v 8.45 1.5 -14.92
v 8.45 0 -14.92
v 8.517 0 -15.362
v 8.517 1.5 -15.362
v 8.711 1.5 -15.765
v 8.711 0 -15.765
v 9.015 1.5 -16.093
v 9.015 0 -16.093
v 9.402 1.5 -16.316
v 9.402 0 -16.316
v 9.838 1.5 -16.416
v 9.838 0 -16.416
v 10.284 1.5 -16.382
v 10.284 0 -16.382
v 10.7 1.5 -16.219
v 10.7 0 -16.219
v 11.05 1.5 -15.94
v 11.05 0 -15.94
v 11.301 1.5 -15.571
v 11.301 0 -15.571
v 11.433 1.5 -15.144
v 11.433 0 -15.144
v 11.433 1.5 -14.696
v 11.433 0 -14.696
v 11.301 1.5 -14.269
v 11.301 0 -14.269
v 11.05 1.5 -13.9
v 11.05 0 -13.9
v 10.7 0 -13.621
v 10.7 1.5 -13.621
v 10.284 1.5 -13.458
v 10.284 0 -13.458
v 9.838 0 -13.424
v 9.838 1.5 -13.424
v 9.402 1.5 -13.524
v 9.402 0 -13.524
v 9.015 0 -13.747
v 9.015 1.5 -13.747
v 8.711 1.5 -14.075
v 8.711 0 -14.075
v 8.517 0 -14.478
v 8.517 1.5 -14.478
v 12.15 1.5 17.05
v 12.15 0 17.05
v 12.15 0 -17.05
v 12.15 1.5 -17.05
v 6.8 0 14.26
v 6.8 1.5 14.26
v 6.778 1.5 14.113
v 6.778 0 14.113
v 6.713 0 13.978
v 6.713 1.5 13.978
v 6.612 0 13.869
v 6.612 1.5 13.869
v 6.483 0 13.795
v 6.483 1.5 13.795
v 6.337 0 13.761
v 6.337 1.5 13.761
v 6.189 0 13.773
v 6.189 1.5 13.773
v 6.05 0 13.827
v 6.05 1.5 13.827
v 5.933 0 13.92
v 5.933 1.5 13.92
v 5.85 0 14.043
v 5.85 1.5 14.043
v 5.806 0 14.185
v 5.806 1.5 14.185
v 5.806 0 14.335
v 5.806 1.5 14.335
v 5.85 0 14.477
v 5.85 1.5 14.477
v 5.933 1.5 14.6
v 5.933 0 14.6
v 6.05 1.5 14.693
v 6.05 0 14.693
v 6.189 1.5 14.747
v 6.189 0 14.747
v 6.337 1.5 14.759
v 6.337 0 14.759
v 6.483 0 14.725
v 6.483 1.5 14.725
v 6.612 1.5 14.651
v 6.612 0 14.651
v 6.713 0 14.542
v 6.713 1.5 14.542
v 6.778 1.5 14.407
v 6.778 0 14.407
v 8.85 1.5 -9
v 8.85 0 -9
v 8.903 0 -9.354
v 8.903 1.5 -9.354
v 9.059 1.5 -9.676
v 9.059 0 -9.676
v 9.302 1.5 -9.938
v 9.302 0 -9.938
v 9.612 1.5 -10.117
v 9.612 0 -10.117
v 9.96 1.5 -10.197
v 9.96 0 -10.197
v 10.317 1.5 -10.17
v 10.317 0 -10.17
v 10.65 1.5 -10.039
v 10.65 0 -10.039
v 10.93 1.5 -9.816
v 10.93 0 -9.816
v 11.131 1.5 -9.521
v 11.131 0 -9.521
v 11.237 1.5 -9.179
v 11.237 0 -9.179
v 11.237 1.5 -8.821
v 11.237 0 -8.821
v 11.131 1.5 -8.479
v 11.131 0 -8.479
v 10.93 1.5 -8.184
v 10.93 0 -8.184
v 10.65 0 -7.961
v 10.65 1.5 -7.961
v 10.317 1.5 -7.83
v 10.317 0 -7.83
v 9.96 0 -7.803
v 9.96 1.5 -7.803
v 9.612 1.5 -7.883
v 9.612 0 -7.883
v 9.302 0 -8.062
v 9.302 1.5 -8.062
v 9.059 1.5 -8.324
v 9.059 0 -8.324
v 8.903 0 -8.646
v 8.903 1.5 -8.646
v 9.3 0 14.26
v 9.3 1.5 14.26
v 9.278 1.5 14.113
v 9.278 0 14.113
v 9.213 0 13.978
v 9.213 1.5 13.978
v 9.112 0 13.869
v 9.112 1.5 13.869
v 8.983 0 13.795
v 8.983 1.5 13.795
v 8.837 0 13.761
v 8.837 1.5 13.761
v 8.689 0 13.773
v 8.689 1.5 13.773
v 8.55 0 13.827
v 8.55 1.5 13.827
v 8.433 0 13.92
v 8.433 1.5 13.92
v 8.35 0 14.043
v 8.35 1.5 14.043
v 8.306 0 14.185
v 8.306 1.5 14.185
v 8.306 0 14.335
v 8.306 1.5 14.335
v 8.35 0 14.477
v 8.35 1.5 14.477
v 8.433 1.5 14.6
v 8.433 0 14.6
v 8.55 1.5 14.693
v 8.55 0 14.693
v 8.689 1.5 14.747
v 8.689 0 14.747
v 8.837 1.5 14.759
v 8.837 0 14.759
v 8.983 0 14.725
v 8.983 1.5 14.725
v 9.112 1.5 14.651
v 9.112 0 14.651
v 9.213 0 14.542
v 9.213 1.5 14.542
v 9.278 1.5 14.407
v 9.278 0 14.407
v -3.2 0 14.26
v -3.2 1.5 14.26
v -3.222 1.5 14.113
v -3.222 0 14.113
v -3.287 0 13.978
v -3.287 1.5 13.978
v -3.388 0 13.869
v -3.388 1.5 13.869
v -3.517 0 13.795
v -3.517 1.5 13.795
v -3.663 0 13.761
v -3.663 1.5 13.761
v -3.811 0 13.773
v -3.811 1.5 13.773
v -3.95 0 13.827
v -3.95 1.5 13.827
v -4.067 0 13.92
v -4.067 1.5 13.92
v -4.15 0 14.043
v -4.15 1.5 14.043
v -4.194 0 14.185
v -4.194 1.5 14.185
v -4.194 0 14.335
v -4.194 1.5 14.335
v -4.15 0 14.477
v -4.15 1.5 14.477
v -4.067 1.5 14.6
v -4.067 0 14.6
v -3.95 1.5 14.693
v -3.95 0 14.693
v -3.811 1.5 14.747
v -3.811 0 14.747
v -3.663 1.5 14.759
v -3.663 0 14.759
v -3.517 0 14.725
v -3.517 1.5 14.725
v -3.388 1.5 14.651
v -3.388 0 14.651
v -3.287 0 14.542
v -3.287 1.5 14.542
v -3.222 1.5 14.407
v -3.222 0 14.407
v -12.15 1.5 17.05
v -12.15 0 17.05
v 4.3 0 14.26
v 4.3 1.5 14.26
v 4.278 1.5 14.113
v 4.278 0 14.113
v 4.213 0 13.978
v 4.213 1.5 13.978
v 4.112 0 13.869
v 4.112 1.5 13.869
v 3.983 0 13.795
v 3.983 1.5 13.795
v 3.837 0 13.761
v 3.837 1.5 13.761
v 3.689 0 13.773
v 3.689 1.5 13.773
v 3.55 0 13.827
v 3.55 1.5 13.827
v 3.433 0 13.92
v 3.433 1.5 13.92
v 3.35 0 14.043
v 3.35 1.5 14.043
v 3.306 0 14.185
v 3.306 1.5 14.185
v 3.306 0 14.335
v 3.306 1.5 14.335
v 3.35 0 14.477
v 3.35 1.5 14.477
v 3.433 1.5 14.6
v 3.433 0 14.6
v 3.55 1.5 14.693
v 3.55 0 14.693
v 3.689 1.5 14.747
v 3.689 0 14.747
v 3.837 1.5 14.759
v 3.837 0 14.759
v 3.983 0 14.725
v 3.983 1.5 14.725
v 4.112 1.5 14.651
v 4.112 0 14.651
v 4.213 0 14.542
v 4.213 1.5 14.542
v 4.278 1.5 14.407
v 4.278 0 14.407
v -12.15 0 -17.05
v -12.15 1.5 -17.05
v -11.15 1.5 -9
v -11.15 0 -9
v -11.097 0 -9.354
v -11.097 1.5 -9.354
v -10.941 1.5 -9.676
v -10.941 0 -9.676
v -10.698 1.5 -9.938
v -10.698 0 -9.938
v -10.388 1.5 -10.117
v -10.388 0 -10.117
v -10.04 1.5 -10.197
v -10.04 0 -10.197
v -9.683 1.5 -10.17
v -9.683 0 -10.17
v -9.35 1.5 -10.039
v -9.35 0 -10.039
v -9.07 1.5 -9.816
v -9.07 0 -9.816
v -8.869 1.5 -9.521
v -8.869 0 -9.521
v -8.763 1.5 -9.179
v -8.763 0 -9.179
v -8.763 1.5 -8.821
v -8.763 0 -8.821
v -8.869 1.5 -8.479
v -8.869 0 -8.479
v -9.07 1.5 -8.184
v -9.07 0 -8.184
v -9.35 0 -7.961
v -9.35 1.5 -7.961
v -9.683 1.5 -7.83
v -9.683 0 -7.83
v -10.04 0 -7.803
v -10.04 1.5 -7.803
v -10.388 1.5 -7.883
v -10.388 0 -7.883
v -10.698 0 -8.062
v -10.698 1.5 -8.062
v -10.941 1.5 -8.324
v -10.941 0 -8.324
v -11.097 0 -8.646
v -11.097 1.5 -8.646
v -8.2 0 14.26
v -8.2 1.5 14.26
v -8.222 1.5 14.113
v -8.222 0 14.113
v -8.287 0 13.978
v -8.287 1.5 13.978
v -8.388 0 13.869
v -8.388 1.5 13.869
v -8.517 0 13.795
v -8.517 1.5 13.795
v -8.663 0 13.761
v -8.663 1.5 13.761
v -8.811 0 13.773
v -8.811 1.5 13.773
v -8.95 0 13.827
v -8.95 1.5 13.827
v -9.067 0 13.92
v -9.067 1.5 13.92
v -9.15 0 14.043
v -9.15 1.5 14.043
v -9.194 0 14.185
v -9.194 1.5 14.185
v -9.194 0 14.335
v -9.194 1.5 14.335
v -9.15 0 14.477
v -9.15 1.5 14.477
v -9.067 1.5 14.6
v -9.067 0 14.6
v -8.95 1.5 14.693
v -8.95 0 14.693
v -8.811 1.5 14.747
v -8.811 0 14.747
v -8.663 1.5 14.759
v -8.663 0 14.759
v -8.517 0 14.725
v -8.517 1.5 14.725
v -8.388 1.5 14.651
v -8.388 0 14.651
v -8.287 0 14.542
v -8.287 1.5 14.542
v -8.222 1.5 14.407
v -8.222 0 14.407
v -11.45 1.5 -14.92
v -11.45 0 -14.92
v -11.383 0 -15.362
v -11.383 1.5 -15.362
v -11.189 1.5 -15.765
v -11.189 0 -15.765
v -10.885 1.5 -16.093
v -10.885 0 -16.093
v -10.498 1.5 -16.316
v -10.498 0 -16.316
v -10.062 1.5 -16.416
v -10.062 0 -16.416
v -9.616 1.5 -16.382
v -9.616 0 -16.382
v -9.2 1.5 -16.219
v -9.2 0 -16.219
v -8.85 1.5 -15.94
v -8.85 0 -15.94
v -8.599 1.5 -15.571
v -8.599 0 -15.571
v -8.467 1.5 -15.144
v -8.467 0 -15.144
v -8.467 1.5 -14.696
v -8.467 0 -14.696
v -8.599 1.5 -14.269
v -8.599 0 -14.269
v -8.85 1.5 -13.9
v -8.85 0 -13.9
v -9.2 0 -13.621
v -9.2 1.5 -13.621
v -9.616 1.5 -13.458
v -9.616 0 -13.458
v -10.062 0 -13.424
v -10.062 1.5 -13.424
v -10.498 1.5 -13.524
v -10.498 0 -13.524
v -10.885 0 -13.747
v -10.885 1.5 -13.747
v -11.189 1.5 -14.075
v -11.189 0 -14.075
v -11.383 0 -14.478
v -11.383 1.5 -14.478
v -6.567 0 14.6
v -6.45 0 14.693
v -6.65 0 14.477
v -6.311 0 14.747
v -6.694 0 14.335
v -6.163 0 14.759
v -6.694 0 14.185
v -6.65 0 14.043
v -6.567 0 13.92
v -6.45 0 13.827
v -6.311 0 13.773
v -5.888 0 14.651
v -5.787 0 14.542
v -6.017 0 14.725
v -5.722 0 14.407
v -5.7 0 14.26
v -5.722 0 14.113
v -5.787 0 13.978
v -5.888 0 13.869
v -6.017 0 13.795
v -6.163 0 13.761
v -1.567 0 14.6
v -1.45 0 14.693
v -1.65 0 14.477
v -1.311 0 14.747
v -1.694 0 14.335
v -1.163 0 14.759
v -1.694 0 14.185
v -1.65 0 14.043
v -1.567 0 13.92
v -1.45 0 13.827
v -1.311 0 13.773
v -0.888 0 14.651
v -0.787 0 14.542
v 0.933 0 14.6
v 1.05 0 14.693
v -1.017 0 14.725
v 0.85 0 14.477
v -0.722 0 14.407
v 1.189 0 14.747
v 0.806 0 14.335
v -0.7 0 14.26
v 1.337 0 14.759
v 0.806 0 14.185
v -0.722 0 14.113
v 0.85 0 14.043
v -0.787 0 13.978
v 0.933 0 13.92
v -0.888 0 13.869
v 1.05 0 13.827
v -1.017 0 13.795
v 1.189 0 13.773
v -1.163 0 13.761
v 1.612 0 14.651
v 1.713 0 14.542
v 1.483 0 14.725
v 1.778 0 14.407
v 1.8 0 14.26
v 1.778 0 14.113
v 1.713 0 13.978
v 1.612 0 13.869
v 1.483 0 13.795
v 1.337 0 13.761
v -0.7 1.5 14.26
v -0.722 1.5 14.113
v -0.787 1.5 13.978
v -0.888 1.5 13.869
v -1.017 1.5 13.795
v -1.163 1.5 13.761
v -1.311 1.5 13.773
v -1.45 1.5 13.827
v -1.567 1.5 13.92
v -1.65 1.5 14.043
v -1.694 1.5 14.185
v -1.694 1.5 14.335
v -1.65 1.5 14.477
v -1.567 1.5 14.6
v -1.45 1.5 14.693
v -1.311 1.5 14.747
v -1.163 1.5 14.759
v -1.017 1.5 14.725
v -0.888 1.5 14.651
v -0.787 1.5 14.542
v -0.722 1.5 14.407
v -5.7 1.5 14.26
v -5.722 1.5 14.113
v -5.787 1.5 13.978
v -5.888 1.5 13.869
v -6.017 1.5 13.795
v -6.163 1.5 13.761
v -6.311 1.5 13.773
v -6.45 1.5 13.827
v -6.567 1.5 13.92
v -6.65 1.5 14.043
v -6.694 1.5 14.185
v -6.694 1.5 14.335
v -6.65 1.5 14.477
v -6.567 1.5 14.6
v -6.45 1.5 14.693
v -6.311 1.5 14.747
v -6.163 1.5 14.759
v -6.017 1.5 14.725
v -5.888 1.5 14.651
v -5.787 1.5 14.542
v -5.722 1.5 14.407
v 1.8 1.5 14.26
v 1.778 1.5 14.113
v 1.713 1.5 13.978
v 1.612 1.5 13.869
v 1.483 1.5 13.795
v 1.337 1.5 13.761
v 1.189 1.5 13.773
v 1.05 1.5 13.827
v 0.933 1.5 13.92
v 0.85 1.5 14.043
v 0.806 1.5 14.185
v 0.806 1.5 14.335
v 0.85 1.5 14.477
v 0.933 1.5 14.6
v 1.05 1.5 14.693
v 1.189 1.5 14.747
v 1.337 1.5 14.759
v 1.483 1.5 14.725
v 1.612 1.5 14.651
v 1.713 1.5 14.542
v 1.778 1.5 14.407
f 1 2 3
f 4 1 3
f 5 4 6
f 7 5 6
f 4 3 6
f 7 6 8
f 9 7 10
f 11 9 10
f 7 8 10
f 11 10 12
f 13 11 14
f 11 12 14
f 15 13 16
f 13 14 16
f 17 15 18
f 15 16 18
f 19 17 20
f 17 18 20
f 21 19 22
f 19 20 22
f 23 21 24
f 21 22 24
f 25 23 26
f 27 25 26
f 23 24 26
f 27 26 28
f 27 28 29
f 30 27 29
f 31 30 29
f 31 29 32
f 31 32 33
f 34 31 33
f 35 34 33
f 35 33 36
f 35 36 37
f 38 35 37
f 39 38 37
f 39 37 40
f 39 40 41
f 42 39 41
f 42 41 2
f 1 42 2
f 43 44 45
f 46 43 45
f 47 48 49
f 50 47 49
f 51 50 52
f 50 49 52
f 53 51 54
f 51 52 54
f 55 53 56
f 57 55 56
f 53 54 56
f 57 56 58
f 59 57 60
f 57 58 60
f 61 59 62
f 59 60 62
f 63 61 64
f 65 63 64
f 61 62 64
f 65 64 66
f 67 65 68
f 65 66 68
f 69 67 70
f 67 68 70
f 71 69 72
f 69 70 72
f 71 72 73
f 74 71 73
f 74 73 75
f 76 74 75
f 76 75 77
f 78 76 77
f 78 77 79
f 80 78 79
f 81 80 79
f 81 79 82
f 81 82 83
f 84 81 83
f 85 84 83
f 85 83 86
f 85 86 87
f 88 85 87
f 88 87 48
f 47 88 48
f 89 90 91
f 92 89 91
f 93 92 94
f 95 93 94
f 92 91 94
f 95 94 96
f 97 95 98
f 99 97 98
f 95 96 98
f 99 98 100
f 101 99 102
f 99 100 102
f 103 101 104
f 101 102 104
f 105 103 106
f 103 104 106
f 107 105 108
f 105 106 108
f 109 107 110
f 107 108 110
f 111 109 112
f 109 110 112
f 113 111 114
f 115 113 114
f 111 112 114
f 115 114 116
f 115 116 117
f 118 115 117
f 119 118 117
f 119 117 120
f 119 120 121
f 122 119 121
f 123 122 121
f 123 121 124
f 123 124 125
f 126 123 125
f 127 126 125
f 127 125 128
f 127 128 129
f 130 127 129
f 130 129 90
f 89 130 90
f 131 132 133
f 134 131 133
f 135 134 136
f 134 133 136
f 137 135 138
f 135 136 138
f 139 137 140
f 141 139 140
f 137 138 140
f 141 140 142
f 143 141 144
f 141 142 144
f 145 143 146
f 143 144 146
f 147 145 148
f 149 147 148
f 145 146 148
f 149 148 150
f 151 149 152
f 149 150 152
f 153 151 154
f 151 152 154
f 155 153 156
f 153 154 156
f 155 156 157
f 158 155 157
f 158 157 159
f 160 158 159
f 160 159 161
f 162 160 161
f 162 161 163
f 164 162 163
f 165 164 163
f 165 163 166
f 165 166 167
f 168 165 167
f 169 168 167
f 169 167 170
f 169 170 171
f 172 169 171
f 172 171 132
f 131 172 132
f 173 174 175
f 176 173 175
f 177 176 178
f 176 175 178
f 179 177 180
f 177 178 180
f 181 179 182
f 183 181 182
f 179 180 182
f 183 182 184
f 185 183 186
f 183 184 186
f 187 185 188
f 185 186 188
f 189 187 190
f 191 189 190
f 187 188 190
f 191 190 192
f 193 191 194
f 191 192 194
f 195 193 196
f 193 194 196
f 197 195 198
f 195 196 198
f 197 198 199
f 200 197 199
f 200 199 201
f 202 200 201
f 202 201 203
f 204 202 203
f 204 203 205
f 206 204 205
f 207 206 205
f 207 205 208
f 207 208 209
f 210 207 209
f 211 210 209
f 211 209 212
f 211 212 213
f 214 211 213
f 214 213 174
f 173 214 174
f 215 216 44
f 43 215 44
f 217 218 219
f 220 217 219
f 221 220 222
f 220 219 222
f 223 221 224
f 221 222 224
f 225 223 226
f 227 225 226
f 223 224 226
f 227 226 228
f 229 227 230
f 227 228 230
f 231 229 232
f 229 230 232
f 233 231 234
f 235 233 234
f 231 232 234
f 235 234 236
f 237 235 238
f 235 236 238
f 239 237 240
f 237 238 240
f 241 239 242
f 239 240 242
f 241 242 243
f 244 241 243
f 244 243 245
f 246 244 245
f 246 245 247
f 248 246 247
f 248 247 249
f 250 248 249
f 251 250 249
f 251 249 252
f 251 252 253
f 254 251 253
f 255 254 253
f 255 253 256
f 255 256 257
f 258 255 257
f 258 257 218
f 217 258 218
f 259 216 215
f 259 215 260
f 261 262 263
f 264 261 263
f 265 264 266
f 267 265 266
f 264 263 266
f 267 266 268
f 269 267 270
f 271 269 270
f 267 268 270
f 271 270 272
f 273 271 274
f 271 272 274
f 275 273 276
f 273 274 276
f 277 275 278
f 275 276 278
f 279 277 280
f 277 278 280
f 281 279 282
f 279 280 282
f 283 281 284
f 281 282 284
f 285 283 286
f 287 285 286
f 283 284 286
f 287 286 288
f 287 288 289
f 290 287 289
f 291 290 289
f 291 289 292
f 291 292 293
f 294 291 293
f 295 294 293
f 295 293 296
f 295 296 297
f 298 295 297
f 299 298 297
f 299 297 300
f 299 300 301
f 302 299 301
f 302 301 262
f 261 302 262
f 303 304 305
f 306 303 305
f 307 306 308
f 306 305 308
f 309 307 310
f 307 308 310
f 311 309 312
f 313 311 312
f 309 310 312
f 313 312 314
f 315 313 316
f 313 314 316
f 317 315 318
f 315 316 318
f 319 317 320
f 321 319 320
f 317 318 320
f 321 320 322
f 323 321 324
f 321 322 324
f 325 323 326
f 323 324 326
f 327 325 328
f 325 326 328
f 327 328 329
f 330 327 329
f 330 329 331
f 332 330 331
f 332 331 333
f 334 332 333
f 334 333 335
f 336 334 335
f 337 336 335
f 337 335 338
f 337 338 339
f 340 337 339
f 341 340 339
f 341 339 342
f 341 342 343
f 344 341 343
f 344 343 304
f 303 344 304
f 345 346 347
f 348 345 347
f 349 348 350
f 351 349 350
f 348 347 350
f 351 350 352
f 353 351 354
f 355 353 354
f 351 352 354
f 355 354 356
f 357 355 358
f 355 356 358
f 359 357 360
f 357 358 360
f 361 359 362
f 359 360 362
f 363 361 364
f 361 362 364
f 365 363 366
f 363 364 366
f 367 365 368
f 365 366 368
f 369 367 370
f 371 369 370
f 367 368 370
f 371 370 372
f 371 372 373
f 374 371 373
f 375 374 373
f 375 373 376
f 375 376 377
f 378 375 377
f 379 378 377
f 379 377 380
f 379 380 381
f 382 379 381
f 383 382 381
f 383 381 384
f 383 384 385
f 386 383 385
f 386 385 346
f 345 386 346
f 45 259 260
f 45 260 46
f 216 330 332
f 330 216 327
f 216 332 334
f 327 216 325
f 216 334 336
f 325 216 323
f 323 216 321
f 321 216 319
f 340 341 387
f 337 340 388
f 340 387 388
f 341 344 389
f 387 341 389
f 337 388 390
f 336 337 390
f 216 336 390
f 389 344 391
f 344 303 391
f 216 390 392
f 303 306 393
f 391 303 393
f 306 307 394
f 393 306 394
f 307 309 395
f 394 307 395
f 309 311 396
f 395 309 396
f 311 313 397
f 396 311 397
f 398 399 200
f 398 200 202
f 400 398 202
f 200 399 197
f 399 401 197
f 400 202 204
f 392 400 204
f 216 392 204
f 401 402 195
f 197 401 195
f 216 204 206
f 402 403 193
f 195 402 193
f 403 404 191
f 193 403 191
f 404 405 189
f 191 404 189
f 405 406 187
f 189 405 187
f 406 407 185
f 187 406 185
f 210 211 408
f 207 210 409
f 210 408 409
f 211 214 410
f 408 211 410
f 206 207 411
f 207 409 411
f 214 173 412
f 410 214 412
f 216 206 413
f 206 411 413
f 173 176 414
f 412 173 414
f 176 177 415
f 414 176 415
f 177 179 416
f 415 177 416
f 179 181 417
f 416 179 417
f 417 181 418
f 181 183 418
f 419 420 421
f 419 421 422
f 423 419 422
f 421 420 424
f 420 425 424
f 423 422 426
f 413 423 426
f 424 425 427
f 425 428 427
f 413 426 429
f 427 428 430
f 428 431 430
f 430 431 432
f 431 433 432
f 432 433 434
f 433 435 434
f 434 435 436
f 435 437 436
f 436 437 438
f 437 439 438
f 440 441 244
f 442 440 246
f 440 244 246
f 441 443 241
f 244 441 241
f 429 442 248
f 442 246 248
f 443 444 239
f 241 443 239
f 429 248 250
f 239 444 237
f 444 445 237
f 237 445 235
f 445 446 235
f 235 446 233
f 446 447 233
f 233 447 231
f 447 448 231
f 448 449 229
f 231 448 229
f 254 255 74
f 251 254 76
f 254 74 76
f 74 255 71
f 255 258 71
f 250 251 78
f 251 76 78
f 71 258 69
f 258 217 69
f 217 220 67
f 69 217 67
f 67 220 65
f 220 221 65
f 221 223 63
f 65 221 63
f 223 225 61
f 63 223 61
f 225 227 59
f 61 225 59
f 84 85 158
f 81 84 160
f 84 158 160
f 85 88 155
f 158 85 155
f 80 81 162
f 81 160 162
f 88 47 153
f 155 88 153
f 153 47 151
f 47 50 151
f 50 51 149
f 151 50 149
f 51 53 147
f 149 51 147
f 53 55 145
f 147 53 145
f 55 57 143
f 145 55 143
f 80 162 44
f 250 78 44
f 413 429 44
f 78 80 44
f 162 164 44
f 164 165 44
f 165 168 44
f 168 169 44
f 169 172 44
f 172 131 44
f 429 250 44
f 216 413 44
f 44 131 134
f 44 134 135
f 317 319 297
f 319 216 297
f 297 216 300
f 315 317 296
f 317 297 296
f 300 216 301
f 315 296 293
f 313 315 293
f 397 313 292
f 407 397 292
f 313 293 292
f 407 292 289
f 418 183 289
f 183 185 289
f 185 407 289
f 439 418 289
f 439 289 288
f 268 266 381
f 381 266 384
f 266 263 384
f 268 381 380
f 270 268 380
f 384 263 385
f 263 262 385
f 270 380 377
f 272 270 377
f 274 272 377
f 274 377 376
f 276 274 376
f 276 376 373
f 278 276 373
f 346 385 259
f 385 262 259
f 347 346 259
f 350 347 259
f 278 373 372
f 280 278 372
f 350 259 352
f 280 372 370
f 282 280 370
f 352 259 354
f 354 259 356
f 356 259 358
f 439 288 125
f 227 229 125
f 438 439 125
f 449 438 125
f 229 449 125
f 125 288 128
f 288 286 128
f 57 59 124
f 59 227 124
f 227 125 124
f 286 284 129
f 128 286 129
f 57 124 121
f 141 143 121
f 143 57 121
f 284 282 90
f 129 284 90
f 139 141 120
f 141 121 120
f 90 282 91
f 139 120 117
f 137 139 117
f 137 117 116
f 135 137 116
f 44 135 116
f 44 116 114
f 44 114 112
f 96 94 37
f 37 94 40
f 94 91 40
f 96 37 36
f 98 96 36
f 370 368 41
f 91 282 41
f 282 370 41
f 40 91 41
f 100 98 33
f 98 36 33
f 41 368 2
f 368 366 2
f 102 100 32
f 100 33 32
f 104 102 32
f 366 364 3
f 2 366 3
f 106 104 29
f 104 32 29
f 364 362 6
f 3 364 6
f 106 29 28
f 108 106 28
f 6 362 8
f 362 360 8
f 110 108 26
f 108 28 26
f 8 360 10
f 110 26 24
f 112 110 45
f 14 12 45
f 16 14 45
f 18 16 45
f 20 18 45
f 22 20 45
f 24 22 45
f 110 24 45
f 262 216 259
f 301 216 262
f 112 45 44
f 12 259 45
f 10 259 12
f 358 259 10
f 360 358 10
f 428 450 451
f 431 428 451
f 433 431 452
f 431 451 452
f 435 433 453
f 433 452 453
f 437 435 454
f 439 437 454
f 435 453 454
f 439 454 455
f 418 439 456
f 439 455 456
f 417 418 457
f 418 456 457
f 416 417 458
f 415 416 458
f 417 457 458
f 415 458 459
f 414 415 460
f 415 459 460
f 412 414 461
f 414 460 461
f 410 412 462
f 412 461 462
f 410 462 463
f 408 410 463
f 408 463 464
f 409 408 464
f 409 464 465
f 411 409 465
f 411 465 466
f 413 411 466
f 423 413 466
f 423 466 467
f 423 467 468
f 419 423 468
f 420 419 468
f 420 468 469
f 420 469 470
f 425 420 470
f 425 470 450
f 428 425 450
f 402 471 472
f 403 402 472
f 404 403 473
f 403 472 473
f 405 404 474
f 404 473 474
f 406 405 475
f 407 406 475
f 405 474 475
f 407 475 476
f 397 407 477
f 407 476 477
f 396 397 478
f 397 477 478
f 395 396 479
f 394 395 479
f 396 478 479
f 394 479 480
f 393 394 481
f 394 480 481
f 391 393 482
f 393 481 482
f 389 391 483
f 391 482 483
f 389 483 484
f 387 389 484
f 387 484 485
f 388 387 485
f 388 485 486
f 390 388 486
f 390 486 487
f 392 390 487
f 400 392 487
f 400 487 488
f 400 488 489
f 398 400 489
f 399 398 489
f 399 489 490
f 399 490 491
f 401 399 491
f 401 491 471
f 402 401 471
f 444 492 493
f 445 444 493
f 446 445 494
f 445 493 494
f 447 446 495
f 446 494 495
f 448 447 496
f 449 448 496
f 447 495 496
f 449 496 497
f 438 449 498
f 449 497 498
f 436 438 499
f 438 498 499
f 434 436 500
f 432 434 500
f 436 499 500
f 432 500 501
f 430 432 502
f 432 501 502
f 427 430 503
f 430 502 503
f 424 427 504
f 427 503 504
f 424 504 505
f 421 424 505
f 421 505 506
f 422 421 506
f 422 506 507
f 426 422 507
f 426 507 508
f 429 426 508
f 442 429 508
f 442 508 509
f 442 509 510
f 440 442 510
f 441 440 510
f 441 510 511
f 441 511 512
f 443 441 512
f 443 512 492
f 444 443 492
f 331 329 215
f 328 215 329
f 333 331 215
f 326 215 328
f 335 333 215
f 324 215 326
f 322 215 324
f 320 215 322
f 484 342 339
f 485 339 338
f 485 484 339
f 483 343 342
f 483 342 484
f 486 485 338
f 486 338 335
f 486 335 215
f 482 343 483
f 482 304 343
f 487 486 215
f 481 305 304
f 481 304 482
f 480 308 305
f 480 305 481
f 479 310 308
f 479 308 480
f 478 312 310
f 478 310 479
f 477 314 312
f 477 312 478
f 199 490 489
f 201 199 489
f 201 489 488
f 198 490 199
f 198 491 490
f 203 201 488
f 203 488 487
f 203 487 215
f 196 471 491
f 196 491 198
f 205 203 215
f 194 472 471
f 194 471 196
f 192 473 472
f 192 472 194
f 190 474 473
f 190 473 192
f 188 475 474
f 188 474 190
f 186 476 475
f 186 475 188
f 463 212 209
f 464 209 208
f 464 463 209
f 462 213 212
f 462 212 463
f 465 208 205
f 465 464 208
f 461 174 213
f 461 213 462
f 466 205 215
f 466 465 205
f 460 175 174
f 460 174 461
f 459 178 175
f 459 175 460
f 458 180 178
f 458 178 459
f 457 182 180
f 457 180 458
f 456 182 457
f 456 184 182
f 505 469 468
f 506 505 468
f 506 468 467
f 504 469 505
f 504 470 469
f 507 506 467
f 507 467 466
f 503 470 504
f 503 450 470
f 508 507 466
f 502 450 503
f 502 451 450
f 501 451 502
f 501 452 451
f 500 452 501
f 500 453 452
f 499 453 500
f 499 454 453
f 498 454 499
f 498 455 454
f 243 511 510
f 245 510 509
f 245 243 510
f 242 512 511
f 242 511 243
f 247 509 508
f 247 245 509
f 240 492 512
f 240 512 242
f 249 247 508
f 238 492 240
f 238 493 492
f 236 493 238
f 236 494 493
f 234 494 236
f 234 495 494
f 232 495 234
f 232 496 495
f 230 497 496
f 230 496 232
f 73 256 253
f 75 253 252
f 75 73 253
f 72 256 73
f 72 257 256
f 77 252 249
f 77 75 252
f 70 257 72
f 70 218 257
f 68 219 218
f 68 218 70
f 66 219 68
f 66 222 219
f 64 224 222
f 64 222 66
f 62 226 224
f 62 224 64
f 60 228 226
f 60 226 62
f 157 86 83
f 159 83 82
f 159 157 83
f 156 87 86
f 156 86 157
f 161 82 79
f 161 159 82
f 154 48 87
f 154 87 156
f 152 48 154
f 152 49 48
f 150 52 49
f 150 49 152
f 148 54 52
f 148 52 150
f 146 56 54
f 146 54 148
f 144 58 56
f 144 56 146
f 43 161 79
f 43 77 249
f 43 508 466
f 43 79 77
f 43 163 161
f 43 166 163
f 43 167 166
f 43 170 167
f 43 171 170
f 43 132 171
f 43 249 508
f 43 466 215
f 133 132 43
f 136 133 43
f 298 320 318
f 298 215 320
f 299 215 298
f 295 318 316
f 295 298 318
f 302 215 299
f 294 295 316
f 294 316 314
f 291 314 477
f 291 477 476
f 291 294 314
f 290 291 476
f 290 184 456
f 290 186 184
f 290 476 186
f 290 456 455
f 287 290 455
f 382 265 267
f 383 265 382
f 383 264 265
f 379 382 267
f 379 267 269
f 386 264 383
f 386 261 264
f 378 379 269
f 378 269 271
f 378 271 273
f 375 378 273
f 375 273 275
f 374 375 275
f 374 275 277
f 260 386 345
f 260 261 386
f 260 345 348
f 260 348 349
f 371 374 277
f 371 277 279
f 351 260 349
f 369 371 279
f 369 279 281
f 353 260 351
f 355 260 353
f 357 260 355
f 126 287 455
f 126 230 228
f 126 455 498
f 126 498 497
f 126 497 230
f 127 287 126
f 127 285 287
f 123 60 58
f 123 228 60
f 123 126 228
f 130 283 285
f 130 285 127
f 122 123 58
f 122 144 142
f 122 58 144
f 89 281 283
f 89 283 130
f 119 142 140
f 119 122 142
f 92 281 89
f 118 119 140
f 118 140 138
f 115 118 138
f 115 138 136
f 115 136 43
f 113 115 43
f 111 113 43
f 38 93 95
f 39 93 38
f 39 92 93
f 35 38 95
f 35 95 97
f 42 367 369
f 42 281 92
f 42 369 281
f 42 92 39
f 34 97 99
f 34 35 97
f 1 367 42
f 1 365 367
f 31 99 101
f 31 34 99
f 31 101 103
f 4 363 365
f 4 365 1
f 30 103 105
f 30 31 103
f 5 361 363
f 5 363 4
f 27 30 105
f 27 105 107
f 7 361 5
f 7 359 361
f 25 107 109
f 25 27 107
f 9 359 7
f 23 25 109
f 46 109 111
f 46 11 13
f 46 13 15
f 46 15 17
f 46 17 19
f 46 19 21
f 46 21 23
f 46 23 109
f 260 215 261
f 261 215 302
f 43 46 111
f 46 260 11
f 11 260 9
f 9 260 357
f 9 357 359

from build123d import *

# Parameters (mm, degrees)
SKETCH1_W             = 24.3
SKETCH1_H             = 34.1
BOSS_EXTRUDE1_DEPTH   = 1.5
F_3_0MM_DOWEL_HOLE1_D = 3
M2_CLEARANCE_HOLE1_D  = 2.4
CUT_EXTRUDE1_REACH    = 3.5
SKETCH9_R             = 0.5


with BuildPart() as part:
    # Sketch1 → Boss-Extrude1 (new body)
    with BuildSketch(Plane(origin=(0, 0, 0), x_dir=(1, 0, 0), z_dir=(0, 1, 0))):
        Rectangle(SKETCH1_W, SKETCH1_H)
    extrude(amount=BOSS_EXTRUDE1_DEPTH)

    # Ø3.0mm Dowel Hole1 (through all)
    with Locations(Plane(origin=(0, 1.5, 0), x_dir=(1, 0, 0), z_dir=(0, 1, 0))):
        with Locations((-9.95, 14.92), (9.95, 14.92)):
            Hole(F_3_0MM_DOWEL_HOLE1_D / 2)

    # M2 Clearance Hole1 (through all)
    with Locations(Plane(origin=(0, 1.5, 0), x_dir=(1, 0, 0), z_dir=(0, 1, 0))):
        with Locations((-9.95, 9), (10.05, 9)):
            Hole(M2_CLEARANCE_HOLE1_D / 2)

    # Sketch9 → Cut-Extrude1 (cut, up to next)
    with BuildSketch(Plane(origin=(0, 1.5, 0), x_dir=(1, 0, 0), z_dir=(0, 1, 0)), mode=Mode.PRIVATE) as cut_extrude1_sk1:
        with Locations((-8.7, -14.26)):
            Circle(SKETCH9_R)
    cut_extrude1_tool1 = extrude(cut_extrude1_sk1.sketch, amount=-CUT_EXTRUDE1_REACH, mode=Mode.PRIVATE) & part.part
    add(cut_extrude1_tool1.solids().sort_by_distance((-8.7, 1.5, 14.26))[0], mode=Mode.SUBTRACT)
    # Sketch9 → Cut-Extrude1 (cut, up to next)
    with BuildSketch(Plane(origin=(0, 1.5, 0), x_dir=(1, 0, 0), z_dir=(0, 1, 0)), mode=Mode.PRIVATE) as cut_extrude1_sk2:
        with Locations((-6.2, -14.26)):
            Circle(SKETCH9_R)
    cut_extrude1_tool2 = extrude(cut_extrude1_sk2.sketch, amount=-CUT_EXTRUDE1_REACH, mode=Mode.PRIVATE) & part.part
    add(cut_extrude1_tool2.solids().sort_by_distance((-6.2, 1.5, 14.26))[0], mode=Mode.SUBTRACT)
    # Sketch9 → Cut-Extrude1 (cut, up to next)
    with BuildSketch(Plane(origin=(0, 1.5, 0), x_dir=(1, 0, 0), z_dir=(0, 1, 0)), mode=Mode.PRIVATE) as cut_extrude1_sk3:
        with Locations((-3.7, -14.26)):
            Circle(SKETCH9_R)
    cut_extrude1_tool3 = extrude(cut_extrude1_sk3.sketch, amount=-CUT_EXTRUDE1_REACH, mode=Mode.PRIVATE) & part.part
    add(cut_extrude1_tool3.solids().sort_by_distance((-3.7, 1.5, 14.26))[0], mode=Mode.SUBTRACT)
    # Sketch9 → Cut-Extrude1 (cut, up to next)
    with BuildSketch(Plane(origin=(0, 1.5, 0), x_dir=(1, 0, 0), z_dir=(0, 1, 0)), mode=Mode.PRIVATE) as cut_extrude1_sk4:
        with Locations((-1.2, -14.26)):
            Circle(SKETCH9_R)
    cut_extrude1_tool4 = extrude(cut_extrude1_sk4.sketch, amount=-CUT_EXTRUDE1_REACH, mode=Mode.PRIVATE) & part.part
    add(cut_extrude1_tool4.solids().sort_by_distance((-1.2, 1.5, 14.26))[0], mode=Mode.SUBTRACT)
    # Sketch9 → Cut-Extrude1 (cut, up to next)
    with BuildSketch(Plane(origin=(0, 1.5, 0), x_dir=(1, 0, 0), z_dir=(0, 1, 0)), mode=Mode.PRIVATE) as cut_extrude1_sk5:
        with Locations((1.3, -14.26)):
            Circle(SKETCH9_R)
    cut_extrude1_tool5 = extrude(cut_extrude1_sk5.sketch, amount=-CUT_EXTRUDE1_REACH, mode=Mode.PRIVATE) & part.part
    add(cut_extrude1_tool5.solids().sort_by_distance((1.3, 1.5, 14.26))[0], mode=Mode.SUBTRACT)
    # Sketch9 → Cut-Extrude1 (cut, up to next)
    with BuildSketch(Plane(origin=(0, 1.5, 0), x_dir=(1, 0, 0), z_dir=(0, 1, 0)), mode=Mode.PRIVATE) as cut_extrude1_sk6:
        with Locations((3.8, -14.26)):
            Circle(SKETCH9_R)
    cut_extrude1_tool6 = extrude(cut_extrude1_sk6.sketch, amount=-CUT_EXTRUDE1_REACH, mode=Mode.PRIVATE) & part.part
    add(cut_extrude1_tool6.solids().sort_by_distance((3.8, 1.5, 14.26))[0], mode=Mode.SUBTRACT)
    # Sketch9 → Cut-Extrude1 (cut, up to next)
    with BuildSketch(Plane(origin=(0, 1.5, 0), x_dir=(1, 0, 0), z_dir=(0, 1, 0)), mode=Mode.PRIVATE) as cut_extrude1_sk7:
        with Locations((6.3, -14.26)):
            Circle(SKETCH9_R)
    cut_extrude1_tool7 = extrude(cut_extrude1_sk7.sketch, amount=-CUT_EXTRUDE1_REACH, mode=Mode.PRIVATE) & part.part
    add(cut_extrude1_tool7.solids().sort_by_distance((6.3, 1.5, 14.26))[0], mode=Mode.SUBTRACT)
    # Sketch9 → Cut-Extrude1 (cut, up to next)
    with BuildSketch(Plane(origin=(0, 1.5, 0), x_dir=(1, 0, 0), z_dir=(0, 1, 0)), mode=Mode.PRIVATE) as cut_extrude1_sk8:
        with Locations((8.8, -14.26)):
            Circle(SKETCH9_R)
    cut_extrude1_tool8 = extrude(cut_extrude1_sk8.sketch, amount=-CUT_EXTRUDE1_REACH, mode=Mode.PRIVATE) & part.part
    add(cut_extrude1_tool8.solids().sort_by_distance((8.8, 1.5, 14.26))[0], mode=Mode.SUBTRACT)


solid = part.part
